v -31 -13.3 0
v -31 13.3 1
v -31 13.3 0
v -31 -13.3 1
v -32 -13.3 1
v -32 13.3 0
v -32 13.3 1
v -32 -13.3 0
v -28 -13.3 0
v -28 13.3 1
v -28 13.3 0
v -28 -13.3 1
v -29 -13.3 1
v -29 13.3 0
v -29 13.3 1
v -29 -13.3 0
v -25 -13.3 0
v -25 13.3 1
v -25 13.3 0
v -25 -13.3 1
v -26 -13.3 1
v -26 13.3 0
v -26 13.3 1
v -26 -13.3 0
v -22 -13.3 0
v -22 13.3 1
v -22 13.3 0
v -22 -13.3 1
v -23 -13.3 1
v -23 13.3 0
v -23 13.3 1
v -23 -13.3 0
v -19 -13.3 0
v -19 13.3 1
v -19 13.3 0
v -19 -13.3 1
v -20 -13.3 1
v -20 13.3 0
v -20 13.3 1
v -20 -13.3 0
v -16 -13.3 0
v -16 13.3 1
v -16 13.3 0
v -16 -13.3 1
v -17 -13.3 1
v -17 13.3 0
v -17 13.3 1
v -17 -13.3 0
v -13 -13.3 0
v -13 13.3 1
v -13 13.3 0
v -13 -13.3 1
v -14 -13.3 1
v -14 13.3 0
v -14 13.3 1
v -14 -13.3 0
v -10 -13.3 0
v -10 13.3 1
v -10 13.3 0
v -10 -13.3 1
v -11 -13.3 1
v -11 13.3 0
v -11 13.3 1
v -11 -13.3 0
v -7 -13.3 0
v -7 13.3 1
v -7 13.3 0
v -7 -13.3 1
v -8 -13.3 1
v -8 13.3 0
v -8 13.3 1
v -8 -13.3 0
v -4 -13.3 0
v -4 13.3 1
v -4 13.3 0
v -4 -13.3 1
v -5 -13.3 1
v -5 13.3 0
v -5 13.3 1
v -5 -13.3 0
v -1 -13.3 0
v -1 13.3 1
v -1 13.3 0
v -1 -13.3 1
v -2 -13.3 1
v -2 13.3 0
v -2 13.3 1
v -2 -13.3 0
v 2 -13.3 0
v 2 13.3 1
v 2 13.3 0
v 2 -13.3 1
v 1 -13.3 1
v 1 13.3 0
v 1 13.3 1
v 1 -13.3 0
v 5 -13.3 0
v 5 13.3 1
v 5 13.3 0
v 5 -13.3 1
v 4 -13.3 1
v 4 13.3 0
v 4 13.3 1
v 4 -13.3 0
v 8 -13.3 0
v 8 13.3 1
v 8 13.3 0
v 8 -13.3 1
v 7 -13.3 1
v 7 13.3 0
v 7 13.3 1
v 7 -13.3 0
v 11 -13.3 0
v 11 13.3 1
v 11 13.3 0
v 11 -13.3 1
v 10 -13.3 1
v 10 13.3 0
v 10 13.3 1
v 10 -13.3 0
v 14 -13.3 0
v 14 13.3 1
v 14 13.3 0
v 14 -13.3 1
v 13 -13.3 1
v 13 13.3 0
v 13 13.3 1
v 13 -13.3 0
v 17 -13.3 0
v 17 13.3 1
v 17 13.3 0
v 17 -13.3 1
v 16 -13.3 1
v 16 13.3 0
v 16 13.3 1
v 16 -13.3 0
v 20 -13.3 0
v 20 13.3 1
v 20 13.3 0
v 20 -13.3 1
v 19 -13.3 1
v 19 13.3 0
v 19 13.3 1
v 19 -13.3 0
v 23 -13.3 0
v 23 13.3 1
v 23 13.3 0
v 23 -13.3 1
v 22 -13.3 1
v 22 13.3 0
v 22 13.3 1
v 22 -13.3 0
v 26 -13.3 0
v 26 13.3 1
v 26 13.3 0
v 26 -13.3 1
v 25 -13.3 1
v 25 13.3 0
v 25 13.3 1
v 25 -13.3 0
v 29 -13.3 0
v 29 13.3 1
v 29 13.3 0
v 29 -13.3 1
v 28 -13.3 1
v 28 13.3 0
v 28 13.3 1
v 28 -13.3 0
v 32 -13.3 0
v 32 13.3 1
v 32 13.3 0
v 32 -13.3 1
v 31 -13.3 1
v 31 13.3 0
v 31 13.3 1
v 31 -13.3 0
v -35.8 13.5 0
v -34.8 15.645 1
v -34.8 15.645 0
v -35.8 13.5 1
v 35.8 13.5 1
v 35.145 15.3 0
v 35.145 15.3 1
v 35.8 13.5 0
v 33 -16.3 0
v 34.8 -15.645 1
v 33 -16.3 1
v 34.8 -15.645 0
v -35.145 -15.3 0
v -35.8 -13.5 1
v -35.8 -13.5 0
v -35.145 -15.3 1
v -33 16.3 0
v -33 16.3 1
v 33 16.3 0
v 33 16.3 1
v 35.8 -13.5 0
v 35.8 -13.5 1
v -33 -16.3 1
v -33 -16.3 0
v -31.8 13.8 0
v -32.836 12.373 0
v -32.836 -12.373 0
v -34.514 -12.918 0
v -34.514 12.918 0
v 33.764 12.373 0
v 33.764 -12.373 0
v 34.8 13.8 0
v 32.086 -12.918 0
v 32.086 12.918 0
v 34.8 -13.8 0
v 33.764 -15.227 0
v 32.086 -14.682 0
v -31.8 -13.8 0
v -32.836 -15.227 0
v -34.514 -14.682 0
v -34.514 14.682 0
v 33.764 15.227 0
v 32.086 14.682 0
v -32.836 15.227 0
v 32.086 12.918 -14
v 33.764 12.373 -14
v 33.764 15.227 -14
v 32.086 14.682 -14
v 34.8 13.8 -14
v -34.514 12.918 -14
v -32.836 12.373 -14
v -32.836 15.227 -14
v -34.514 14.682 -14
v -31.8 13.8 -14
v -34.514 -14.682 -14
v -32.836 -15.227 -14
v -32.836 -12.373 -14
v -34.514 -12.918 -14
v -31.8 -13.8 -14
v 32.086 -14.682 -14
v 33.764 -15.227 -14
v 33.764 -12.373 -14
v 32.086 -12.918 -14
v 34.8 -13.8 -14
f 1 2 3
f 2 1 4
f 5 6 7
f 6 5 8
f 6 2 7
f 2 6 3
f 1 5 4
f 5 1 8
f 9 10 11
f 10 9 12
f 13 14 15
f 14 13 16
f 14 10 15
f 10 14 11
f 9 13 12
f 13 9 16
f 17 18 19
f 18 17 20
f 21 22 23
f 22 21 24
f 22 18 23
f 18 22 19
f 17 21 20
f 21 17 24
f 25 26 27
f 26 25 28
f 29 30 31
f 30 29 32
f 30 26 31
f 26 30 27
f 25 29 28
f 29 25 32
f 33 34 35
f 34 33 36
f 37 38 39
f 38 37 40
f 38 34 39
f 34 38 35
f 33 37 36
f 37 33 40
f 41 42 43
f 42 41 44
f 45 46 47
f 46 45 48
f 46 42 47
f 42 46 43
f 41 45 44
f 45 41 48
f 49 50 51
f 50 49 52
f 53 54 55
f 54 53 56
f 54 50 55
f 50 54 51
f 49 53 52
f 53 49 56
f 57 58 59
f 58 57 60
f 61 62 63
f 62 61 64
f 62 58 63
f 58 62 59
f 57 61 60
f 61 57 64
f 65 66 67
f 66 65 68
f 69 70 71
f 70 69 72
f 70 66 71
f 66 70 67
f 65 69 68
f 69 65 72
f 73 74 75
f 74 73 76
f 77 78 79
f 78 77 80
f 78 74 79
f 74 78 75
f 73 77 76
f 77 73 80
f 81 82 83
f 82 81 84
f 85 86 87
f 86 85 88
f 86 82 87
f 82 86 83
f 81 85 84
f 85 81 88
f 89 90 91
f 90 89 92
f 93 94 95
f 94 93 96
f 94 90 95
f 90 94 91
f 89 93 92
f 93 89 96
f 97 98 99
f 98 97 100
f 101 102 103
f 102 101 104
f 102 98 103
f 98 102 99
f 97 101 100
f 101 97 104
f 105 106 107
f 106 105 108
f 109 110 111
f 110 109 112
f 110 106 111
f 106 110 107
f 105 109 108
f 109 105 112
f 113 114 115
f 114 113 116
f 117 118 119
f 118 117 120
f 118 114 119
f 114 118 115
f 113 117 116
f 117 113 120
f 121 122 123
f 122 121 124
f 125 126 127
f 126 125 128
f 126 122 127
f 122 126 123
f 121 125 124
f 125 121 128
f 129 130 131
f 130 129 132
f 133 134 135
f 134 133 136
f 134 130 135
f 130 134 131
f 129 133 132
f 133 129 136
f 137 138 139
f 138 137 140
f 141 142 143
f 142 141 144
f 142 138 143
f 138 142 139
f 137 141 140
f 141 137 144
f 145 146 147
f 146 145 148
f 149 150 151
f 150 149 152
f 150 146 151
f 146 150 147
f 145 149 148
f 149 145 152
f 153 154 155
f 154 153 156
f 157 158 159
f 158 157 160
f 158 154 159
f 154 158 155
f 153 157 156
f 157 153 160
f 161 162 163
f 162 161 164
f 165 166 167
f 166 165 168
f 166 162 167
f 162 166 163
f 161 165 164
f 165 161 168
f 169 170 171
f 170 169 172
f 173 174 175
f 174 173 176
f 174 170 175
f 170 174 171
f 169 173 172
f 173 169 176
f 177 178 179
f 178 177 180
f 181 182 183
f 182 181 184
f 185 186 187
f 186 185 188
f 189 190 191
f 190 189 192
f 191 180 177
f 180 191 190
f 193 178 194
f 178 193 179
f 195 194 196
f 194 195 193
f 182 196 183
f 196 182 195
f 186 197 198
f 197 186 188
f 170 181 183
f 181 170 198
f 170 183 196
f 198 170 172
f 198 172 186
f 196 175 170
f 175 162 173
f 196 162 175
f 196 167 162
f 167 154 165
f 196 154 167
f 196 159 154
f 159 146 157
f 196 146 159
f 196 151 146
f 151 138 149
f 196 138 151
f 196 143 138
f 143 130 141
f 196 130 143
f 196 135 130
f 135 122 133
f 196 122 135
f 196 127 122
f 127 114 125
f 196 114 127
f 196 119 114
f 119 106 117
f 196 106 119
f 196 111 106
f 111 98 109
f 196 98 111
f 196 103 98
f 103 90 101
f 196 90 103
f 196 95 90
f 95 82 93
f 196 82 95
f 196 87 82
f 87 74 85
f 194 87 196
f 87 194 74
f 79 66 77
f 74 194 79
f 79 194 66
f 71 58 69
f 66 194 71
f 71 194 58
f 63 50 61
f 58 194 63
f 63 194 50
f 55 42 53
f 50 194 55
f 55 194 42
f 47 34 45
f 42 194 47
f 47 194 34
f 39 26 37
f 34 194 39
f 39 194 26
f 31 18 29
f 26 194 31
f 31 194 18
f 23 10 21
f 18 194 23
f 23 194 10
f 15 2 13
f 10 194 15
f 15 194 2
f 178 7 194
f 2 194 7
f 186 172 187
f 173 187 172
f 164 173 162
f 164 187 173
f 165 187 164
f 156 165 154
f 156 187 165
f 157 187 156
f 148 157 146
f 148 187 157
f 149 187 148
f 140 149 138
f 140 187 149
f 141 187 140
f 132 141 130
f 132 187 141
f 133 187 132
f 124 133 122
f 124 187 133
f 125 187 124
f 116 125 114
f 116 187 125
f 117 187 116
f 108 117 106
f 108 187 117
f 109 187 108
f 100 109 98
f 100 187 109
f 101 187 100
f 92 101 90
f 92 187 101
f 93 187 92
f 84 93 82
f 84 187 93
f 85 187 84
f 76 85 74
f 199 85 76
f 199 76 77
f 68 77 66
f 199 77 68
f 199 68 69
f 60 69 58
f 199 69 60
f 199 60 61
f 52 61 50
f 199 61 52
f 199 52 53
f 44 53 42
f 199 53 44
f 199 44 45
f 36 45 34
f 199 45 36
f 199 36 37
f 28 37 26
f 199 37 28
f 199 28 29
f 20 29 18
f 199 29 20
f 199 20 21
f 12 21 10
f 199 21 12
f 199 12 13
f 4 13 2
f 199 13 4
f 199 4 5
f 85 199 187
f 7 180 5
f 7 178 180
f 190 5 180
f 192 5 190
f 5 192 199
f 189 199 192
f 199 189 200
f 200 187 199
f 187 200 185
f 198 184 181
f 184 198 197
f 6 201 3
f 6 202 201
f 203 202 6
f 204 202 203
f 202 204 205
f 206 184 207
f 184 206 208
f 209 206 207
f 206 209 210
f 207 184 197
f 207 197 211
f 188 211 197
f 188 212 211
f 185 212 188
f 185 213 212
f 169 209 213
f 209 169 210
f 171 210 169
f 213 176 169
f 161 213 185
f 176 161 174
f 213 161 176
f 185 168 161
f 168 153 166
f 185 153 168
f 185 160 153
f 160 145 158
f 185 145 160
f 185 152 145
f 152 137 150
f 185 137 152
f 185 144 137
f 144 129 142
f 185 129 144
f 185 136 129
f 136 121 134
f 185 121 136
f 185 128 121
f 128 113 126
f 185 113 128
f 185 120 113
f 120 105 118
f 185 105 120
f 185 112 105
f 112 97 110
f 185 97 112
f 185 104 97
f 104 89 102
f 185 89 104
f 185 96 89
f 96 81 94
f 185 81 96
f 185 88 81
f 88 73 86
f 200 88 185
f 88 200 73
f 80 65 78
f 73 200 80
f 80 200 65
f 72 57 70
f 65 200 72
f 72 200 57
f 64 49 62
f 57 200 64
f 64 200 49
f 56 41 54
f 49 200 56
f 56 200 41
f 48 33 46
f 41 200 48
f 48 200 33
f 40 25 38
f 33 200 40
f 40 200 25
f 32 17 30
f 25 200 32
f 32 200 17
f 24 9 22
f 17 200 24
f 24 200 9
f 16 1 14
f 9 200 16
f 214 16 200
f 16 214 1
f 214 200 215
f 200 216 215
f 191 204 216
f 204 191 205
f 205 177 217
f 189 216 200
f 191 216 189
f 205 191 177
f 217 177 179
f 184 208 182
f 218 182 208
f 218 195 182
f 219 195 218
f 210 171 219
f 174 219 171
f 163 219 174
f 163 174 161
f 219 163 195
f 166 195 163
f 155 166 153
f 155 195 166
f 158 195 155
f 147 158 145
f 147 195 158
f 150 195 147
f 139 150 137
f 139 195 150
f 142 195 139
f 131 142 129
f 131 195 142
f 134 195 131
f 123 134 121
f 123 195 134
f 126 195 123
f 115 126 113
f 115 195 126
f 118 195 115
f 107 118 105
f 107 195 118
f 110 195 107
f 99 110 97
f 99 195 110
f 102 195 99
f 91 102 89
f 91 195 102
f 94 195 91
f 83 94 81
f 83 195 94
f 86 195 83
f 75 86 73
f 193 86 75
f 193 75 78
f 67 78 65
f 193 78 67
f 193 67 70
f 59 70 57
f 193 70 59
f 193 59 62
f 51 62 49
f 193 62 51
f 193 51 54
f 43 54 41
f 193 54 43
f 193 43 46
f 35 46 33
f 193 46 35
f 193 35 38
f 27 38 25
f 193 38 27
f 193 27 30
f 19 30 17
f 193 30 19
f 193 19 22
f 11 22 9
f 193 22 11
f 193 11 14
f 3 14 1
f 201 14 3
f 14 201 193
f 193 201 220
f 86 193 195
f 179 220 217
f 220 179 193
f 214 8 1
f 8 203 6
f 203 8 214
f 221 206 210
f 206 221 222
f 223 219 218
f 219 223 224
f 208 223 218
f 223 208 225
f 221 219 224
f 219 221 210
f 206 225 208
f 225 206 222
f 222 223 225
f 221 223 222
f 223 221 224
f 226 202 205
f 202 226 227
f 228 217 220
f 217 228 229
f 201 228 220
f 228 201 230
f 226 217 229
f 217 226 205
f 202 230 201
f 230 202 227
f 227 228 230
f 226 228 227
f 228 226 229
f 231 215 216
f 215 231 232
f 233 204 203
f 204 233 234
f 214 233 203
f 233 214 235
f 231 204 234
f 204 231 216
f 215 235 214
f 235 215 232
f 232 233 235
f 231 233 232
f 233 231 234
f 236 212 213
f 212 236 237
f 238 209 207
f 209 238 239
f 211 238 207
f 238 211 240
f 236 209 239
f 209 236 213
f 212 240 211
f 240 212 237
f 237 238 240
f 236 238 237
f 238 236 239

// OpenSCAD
// Box parameters (should match your existing box parameters)
length = 76;             // Outer length of the box
width = 37;              // Outer width of the box
wall_thickness = 2;      // Thickness of the walls
corner_radius = 5;       // Radius of the outer corners

// Separator parameters
separator_thickness = 1;           // Thickness of the separator
separator_clearance = 0.2;         // Clearance for proper fit

// Pillar parameters
pillar_radius = 1.5;               // Radius of the pillars
pillar_height = 14;                // Height of the pillars (as per your request)
pillar_margin = 1;                 // Margin from the edges

// Ventilation parameters
vent_line_width = 1;             // Width of the ventilation lines (made thinner)
vent_line_spacing = 3;             // Spacing between lines (center to center)

// Inner dimensions of the box
inner_length = length - 2 * wall_thickness;
inner_width  = width - 2 * wall_thickness;

// Inner corner radius
inner_corner_radius = corner_radius - wall_thickness;

// Separator dimensions
separator_length = inner_length - 2 * separator_clearance;
separator_width  = inner_width - 2 * separator_clearance;
separator_radius = inner_corner_radius - separator_clearance;

// Create the separator with ventilation lines and pillars
module separator_with_ventilation_lines_and_pillars() {
    // Separator plate with ventilation lines
    difference() {
        // Separator plate
        translate([0, 0, 0])
            linear_extrude(separator_thickness)
                rounded_rectangle(separator_length, separator_width, separator_radius);

        // Ventilation lines
        vent_lines();
    }

    // Pillars
    // Positions for the pillars (stepped back by pillar_margin from the edges)
    positions = [
        [ separator_length / 2 - pillar_margin - pillar_radius,  separator_width / 2 - pillar_margin - pillar_radius],
        [-separator_length / 2 + pillar_margin + pillar_radius,  separator_width / 2 - pillar_margin - pillar_radius],
        [-separator_length / 2 + pillar_margin + pillar_radius, -separator_width / 2 + pillar_margin + pillar_radius],
        [ separator_length / 2 - pillar_margin - pillar_radius, -separator_width / 2 + pillar_margin + pillar_radius]
    ];

    // Create pillars at each corner, connected to the separator
    for (pos = positions) {
        translate([pos[0], pos[1], -pillar_height])
            pillar(pillar_radius, pillar_height + separator_thickness);
    }
}

// Module to create a rounded rectangle
module rounded_rectangle(len, wid, rad) {
    rad = min(rad, len / 2, wid / 2); // Ensure radius does not exceed half the length or width
    offset(r = rad)
        square([len - 2 * rad, wid - 2 * rad], center = true);
}

// Module to create a pillar (cylinder)
module pillar(radius, height) {
    cylinder(h = height, r = radius, center = false);
}

// Updated Module to create centered, thinner ventilation lines
module vent_lines() {
    // Define the area where lines can be placed, avoiding pillars and edges
    x_min = -separator_length / 2 + pillar_margin + pillar_radius + vent_line_width / 2;
    x_max = separator_length / 2 - pillar_margin - pillar_radius - vent_line_width / 2;
    y_min = -separator_width / 2 + pillar_margin + pillar_radius + vent_line_width / 2;
    y_max = separator_width / 2 - pillar_margin - pillar_radius - vent_line_width / 2;

    // Calculate the number of lines that fit within x_min and x_max
    available_width = x_max - x_min;
    num_lines = floor((available_width + vent_line_spacing) / vent_line_spacing);
    total_spacing = (num_lines - 1) * vent_line_spacing;
    offset = (available_width - total_spacing) / 2;

    // Create lines across the separator, centered
    for (i = [0 : num_lines - 1]) {
        x = x_min + offset + i * vent_line_spacing;
        translate([x - vent_line_width / 2, y_min, -1]) // Adjusted positioning
            cube([vent_line_width, y_max - y_min, separator_thickness + 2], center = false);
    }
}

// Render the separator with ventilation lines and pillars
separator_with_ventilation_lines_and_pillars();
